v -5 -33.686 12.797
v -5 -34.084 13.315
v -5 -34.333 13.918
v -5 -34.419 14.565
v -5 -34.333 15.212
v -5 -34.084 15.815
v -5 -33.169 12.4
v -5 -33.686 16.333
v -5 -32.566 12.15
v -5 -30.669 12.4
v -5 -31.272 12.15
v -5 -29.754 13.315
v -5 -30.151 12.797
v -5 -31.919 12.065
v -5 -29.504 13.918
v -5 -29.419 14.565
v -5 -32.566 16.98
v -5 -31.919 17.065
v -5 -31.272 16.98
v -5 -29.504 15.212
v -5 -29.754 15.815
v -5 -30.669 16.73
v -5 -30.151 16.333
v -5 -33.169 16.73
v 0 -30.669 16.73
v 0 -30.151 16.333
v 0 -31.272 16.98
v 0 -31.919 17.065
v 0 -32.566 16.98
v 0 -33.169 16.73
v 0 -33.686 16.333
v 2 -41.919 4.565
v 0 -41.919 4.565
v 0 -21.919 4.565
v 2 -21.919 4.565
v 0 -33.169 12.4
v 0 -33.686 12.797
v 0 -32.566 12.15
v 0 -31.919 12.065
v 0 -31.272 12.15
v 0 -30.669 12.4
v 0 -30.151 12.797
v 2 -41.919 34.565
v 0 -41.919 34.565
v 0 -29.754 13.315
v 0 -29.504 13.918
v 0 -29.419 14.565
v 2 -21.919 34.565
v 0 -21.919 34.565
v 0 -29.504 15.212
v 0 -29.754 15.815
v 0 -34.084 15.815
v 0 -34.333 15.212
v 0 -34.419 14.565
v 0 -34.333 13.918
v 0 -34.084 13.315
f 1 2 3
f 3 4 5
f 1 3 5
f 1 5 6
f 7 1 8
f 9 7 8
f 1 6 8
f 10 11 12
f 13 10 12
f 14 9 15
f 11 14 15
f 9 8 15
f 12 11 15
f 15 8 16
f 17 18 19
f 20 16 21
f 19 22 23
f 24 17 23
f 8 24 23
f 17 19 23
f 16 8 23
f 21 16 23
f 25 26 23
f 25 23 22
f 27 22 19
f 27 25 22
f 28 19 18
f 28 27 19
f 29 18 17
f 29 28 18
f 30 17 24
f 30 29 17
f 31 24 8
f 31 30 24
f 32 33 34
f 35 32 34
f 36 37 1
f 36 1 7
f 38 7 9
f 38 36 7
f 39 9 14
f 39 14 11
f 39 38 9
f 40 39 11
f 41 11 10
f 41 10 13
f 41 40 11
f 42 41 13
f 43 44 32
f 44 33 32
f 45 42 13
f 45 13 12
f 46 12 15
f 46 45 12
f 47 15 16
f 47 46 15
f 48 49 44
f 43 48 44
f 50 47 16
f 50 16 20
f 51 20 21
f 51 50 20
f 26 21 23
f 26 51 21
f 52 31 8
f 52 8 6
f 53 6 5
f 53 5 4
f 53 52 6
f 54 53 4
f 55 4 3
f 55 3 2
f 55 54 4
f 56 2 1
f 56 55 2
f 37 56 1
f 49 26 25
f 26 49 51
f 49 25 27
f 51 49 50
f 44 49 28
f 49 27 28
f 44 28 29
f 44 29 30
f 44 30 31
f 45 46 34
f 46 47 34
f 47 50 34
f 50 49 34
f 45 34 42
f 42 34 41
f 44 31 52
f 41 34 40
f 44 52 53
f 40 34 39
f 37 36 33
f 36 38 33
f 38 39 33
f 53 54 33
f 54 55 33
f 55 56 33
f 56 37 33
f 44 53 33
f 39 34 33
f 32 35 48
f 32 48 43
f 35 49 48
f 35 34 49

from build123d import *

# Parameters (mm, degrees)
F1_DEPTH = 2
F2_DEPTH = 5
F3_DEPTH = 10


with BuildPart() as f1:
    # F0 (on Right) → F1 (new body)
    with BuildSketch(Plane.YZ):
        with BuildLine():
            Line((-33.6863736738, 16.3327330157), (-41.9186067209, 24.5649660628))
            Line((-41.9186067209, 24.5649660628), (-41.9186067209, 4.5649660628))
            Line((-41.9186067209, 4.5649660628), (-33.6863736738, 12.7971991098))
            ThreePointArc((-33.6863736738, 12.7971991098), (-34.4186067209, 14.5649660628), (-33.6863736738, 16.3327330157))
        make_face()
        with BuildLine():
            Line((-21.9186067209, 24.5649660628), (-41.9186067209, 24.5649660628))
            Line((-41.9186067209, 24.5649660628), (-33.6863736738, 16.3327330157))
            ThreePointArc((-33.6863736738, 16.3327330157), (-31.9186067209, 17.0649660628), (-30.1508397679, 16.3327330157))
            Line((-30.1508397679, 16.3327330157), (-21.9186067209, 24.5649660628))
        make_face()
        with BuildLine():
            Line((-21.9186067209, 4.5649660628), (-21.9186067209, 24.5649660628))
            Line((-21.9186067209, 24.5649660628), (-30.1508397679, 16.3327330157))
            ThreePointArc((-30.1508397679, 16.3327330157), (-29.6089078896, 15.5216746437), (-29.4186067209, 14.5649660628))
            ThreePointArc((-29.4186067209, 14.5649660628), (-29.6089078896, 13.6082574819), (-30.1508397679, 12.7971991098))
            Line((-30.1508397679, 12.7971991098), (-21.9186067209, 4.5649660628))
        make_face()
        with BuildLine():
            Line((-33.6863736738, 12.7971991098), (-41.9186067209, 4.5649660628))
            Line((-41.9186067209, 4.5649660628), (-21.9186067209, 4.5649660628))
            Line((-21.9186067209, 4.5649660628), (-30.1508397679, 12.7971991098))
            ThreePointArc((-30.1508397679, 12.7971991098), (-31.9186067209, 12.0649660628), (-33.6863736738, 12.7971991098))
        make_face()
        with BuildLine():
            Line((-31.9186067209, 14.5649660628), (-33.6863736738, 16.3327330157))
            ThreePointArc((-33.6863736738, 16.3327330157), (-34.4186067209, 14.5649660628), (-33.6863736738, 12.7971991098))
            Line((-33.6863736738, 12.7971991098), (-31.9186067209, 14.5649660628))
        make_face()
        with BuildLine():
            ThreePointArc((-30.1508397679, 16.3327330157), (-31.9186067209, 17.0649660628), (-33.6863736738, 16.3327330157))
            Line((-33.6863736738, 16.3327330157), (-31.9186067209, 14.5649660628))
            Line((-31.9186067209, 14.5649660628), (-30.1508397679, 16.3327330157))
        make_face()
        with BuildLine():
            ThreePointArc((-29.4186067209, 14.5649660628), (-29.6089078896, 15.5216746437), (-30.1508397679, 16.3327330157))
            Line((-30.1508397679, 16.3327330157), (-31.9186067209, 14.5649660628))
            Line((-31.9186067209, 14.5649660628), (-30.1508397679, 12.7971991098))
            ThreePointArc((-30.1508397679, 12.7971991098), (-29.6089078896, 13.6082574819), (-29.4186067209, 14.5649660628))
        make_face()
        with BuildLine():
            Line((-31.9186067209, 14.5649660628), (-33.6863736738, 12.7971991098))
            ThreePointArc((-33.6863736738, 12.7971991098), (-31.9186067209, 12.0649660628), (-30.1508397679, 12.7971991098))
            Line((-30.1508397679, 12.7971991098), (-31.9186067209, 14.5649660628))
        make_face()
    extrude(amount=F1_DEPTH)

    # F0 (on Right) → F2 (join)
    with BuildSketch(Plane.YZ):
        with BuildLine():
            ThreePointArc((-29.4186067209, 14.5649660628), (-29.6089078896, 15.5216746437), (-30.1508397679, 16.3327330157))
            Line((-30.1508397679, 16.3327330157), (-31.9186067209, 14.5649660628))
            Line((-31.9186067209, 14.5649660628), (-30.1508397679, 12.7971991098))
            ThreePointArc((-30.1508397679, 12.7971991098), (-29.6089078896, 13.6082574819), (-29.4186067209, 14.5649660628))
        make_face()
        with BuildLine():
            ThreePointArc((-30.1508397679, 16.3327330157), (-31.9186067209, 17.0649660628), (-33.6863736738, 16.3327330157))
            Line((-33.6863736738, 16.3327330157), (-31.9186067209, 14.5649660628))
            Line((-31.9186067209, 14.5649660628), (-30.1508397679, 16.3327330157))
        make_face()
        with BuildLine():
            Line((-31.9186067209, 14.5649660628), (-33.6863736738, 16.3327330157))
            ThreePointArc((-33.6863736738, 16.3327330157), (-34.4186067209, 14.5649660628), (-33.6863736738, 12.7971991098))
            Line((-33.6863736738, 12.7971991098), (-31.9186067209, 14.5649660628))
        make_face()
        with BuildLine():
            Line((-31.9186067209, 14.5649660628), (-33.6863736738, 12.7971991098))
            ThreePointArc((-33.6863736738, 12.7971991098), (-31.9186067209, 12.0649660628), (-30.1508397679, 12.7971991098))
            Line((-30.1508397679, 12.7971991098), (-31.9186067209, 14.5649660628))
        make_face()
    extrude(amount=-F2_DEPTH)

    # F3 (add): a face of the model
    f3_faces = [f1.faces().sort_by_distance(p)[0] for p in [
        (1, -31.9186067209, 24.5649660628),
    ]]
    extrude(f3_faces, amount=F3_DEPTH)


solid = f1.part
